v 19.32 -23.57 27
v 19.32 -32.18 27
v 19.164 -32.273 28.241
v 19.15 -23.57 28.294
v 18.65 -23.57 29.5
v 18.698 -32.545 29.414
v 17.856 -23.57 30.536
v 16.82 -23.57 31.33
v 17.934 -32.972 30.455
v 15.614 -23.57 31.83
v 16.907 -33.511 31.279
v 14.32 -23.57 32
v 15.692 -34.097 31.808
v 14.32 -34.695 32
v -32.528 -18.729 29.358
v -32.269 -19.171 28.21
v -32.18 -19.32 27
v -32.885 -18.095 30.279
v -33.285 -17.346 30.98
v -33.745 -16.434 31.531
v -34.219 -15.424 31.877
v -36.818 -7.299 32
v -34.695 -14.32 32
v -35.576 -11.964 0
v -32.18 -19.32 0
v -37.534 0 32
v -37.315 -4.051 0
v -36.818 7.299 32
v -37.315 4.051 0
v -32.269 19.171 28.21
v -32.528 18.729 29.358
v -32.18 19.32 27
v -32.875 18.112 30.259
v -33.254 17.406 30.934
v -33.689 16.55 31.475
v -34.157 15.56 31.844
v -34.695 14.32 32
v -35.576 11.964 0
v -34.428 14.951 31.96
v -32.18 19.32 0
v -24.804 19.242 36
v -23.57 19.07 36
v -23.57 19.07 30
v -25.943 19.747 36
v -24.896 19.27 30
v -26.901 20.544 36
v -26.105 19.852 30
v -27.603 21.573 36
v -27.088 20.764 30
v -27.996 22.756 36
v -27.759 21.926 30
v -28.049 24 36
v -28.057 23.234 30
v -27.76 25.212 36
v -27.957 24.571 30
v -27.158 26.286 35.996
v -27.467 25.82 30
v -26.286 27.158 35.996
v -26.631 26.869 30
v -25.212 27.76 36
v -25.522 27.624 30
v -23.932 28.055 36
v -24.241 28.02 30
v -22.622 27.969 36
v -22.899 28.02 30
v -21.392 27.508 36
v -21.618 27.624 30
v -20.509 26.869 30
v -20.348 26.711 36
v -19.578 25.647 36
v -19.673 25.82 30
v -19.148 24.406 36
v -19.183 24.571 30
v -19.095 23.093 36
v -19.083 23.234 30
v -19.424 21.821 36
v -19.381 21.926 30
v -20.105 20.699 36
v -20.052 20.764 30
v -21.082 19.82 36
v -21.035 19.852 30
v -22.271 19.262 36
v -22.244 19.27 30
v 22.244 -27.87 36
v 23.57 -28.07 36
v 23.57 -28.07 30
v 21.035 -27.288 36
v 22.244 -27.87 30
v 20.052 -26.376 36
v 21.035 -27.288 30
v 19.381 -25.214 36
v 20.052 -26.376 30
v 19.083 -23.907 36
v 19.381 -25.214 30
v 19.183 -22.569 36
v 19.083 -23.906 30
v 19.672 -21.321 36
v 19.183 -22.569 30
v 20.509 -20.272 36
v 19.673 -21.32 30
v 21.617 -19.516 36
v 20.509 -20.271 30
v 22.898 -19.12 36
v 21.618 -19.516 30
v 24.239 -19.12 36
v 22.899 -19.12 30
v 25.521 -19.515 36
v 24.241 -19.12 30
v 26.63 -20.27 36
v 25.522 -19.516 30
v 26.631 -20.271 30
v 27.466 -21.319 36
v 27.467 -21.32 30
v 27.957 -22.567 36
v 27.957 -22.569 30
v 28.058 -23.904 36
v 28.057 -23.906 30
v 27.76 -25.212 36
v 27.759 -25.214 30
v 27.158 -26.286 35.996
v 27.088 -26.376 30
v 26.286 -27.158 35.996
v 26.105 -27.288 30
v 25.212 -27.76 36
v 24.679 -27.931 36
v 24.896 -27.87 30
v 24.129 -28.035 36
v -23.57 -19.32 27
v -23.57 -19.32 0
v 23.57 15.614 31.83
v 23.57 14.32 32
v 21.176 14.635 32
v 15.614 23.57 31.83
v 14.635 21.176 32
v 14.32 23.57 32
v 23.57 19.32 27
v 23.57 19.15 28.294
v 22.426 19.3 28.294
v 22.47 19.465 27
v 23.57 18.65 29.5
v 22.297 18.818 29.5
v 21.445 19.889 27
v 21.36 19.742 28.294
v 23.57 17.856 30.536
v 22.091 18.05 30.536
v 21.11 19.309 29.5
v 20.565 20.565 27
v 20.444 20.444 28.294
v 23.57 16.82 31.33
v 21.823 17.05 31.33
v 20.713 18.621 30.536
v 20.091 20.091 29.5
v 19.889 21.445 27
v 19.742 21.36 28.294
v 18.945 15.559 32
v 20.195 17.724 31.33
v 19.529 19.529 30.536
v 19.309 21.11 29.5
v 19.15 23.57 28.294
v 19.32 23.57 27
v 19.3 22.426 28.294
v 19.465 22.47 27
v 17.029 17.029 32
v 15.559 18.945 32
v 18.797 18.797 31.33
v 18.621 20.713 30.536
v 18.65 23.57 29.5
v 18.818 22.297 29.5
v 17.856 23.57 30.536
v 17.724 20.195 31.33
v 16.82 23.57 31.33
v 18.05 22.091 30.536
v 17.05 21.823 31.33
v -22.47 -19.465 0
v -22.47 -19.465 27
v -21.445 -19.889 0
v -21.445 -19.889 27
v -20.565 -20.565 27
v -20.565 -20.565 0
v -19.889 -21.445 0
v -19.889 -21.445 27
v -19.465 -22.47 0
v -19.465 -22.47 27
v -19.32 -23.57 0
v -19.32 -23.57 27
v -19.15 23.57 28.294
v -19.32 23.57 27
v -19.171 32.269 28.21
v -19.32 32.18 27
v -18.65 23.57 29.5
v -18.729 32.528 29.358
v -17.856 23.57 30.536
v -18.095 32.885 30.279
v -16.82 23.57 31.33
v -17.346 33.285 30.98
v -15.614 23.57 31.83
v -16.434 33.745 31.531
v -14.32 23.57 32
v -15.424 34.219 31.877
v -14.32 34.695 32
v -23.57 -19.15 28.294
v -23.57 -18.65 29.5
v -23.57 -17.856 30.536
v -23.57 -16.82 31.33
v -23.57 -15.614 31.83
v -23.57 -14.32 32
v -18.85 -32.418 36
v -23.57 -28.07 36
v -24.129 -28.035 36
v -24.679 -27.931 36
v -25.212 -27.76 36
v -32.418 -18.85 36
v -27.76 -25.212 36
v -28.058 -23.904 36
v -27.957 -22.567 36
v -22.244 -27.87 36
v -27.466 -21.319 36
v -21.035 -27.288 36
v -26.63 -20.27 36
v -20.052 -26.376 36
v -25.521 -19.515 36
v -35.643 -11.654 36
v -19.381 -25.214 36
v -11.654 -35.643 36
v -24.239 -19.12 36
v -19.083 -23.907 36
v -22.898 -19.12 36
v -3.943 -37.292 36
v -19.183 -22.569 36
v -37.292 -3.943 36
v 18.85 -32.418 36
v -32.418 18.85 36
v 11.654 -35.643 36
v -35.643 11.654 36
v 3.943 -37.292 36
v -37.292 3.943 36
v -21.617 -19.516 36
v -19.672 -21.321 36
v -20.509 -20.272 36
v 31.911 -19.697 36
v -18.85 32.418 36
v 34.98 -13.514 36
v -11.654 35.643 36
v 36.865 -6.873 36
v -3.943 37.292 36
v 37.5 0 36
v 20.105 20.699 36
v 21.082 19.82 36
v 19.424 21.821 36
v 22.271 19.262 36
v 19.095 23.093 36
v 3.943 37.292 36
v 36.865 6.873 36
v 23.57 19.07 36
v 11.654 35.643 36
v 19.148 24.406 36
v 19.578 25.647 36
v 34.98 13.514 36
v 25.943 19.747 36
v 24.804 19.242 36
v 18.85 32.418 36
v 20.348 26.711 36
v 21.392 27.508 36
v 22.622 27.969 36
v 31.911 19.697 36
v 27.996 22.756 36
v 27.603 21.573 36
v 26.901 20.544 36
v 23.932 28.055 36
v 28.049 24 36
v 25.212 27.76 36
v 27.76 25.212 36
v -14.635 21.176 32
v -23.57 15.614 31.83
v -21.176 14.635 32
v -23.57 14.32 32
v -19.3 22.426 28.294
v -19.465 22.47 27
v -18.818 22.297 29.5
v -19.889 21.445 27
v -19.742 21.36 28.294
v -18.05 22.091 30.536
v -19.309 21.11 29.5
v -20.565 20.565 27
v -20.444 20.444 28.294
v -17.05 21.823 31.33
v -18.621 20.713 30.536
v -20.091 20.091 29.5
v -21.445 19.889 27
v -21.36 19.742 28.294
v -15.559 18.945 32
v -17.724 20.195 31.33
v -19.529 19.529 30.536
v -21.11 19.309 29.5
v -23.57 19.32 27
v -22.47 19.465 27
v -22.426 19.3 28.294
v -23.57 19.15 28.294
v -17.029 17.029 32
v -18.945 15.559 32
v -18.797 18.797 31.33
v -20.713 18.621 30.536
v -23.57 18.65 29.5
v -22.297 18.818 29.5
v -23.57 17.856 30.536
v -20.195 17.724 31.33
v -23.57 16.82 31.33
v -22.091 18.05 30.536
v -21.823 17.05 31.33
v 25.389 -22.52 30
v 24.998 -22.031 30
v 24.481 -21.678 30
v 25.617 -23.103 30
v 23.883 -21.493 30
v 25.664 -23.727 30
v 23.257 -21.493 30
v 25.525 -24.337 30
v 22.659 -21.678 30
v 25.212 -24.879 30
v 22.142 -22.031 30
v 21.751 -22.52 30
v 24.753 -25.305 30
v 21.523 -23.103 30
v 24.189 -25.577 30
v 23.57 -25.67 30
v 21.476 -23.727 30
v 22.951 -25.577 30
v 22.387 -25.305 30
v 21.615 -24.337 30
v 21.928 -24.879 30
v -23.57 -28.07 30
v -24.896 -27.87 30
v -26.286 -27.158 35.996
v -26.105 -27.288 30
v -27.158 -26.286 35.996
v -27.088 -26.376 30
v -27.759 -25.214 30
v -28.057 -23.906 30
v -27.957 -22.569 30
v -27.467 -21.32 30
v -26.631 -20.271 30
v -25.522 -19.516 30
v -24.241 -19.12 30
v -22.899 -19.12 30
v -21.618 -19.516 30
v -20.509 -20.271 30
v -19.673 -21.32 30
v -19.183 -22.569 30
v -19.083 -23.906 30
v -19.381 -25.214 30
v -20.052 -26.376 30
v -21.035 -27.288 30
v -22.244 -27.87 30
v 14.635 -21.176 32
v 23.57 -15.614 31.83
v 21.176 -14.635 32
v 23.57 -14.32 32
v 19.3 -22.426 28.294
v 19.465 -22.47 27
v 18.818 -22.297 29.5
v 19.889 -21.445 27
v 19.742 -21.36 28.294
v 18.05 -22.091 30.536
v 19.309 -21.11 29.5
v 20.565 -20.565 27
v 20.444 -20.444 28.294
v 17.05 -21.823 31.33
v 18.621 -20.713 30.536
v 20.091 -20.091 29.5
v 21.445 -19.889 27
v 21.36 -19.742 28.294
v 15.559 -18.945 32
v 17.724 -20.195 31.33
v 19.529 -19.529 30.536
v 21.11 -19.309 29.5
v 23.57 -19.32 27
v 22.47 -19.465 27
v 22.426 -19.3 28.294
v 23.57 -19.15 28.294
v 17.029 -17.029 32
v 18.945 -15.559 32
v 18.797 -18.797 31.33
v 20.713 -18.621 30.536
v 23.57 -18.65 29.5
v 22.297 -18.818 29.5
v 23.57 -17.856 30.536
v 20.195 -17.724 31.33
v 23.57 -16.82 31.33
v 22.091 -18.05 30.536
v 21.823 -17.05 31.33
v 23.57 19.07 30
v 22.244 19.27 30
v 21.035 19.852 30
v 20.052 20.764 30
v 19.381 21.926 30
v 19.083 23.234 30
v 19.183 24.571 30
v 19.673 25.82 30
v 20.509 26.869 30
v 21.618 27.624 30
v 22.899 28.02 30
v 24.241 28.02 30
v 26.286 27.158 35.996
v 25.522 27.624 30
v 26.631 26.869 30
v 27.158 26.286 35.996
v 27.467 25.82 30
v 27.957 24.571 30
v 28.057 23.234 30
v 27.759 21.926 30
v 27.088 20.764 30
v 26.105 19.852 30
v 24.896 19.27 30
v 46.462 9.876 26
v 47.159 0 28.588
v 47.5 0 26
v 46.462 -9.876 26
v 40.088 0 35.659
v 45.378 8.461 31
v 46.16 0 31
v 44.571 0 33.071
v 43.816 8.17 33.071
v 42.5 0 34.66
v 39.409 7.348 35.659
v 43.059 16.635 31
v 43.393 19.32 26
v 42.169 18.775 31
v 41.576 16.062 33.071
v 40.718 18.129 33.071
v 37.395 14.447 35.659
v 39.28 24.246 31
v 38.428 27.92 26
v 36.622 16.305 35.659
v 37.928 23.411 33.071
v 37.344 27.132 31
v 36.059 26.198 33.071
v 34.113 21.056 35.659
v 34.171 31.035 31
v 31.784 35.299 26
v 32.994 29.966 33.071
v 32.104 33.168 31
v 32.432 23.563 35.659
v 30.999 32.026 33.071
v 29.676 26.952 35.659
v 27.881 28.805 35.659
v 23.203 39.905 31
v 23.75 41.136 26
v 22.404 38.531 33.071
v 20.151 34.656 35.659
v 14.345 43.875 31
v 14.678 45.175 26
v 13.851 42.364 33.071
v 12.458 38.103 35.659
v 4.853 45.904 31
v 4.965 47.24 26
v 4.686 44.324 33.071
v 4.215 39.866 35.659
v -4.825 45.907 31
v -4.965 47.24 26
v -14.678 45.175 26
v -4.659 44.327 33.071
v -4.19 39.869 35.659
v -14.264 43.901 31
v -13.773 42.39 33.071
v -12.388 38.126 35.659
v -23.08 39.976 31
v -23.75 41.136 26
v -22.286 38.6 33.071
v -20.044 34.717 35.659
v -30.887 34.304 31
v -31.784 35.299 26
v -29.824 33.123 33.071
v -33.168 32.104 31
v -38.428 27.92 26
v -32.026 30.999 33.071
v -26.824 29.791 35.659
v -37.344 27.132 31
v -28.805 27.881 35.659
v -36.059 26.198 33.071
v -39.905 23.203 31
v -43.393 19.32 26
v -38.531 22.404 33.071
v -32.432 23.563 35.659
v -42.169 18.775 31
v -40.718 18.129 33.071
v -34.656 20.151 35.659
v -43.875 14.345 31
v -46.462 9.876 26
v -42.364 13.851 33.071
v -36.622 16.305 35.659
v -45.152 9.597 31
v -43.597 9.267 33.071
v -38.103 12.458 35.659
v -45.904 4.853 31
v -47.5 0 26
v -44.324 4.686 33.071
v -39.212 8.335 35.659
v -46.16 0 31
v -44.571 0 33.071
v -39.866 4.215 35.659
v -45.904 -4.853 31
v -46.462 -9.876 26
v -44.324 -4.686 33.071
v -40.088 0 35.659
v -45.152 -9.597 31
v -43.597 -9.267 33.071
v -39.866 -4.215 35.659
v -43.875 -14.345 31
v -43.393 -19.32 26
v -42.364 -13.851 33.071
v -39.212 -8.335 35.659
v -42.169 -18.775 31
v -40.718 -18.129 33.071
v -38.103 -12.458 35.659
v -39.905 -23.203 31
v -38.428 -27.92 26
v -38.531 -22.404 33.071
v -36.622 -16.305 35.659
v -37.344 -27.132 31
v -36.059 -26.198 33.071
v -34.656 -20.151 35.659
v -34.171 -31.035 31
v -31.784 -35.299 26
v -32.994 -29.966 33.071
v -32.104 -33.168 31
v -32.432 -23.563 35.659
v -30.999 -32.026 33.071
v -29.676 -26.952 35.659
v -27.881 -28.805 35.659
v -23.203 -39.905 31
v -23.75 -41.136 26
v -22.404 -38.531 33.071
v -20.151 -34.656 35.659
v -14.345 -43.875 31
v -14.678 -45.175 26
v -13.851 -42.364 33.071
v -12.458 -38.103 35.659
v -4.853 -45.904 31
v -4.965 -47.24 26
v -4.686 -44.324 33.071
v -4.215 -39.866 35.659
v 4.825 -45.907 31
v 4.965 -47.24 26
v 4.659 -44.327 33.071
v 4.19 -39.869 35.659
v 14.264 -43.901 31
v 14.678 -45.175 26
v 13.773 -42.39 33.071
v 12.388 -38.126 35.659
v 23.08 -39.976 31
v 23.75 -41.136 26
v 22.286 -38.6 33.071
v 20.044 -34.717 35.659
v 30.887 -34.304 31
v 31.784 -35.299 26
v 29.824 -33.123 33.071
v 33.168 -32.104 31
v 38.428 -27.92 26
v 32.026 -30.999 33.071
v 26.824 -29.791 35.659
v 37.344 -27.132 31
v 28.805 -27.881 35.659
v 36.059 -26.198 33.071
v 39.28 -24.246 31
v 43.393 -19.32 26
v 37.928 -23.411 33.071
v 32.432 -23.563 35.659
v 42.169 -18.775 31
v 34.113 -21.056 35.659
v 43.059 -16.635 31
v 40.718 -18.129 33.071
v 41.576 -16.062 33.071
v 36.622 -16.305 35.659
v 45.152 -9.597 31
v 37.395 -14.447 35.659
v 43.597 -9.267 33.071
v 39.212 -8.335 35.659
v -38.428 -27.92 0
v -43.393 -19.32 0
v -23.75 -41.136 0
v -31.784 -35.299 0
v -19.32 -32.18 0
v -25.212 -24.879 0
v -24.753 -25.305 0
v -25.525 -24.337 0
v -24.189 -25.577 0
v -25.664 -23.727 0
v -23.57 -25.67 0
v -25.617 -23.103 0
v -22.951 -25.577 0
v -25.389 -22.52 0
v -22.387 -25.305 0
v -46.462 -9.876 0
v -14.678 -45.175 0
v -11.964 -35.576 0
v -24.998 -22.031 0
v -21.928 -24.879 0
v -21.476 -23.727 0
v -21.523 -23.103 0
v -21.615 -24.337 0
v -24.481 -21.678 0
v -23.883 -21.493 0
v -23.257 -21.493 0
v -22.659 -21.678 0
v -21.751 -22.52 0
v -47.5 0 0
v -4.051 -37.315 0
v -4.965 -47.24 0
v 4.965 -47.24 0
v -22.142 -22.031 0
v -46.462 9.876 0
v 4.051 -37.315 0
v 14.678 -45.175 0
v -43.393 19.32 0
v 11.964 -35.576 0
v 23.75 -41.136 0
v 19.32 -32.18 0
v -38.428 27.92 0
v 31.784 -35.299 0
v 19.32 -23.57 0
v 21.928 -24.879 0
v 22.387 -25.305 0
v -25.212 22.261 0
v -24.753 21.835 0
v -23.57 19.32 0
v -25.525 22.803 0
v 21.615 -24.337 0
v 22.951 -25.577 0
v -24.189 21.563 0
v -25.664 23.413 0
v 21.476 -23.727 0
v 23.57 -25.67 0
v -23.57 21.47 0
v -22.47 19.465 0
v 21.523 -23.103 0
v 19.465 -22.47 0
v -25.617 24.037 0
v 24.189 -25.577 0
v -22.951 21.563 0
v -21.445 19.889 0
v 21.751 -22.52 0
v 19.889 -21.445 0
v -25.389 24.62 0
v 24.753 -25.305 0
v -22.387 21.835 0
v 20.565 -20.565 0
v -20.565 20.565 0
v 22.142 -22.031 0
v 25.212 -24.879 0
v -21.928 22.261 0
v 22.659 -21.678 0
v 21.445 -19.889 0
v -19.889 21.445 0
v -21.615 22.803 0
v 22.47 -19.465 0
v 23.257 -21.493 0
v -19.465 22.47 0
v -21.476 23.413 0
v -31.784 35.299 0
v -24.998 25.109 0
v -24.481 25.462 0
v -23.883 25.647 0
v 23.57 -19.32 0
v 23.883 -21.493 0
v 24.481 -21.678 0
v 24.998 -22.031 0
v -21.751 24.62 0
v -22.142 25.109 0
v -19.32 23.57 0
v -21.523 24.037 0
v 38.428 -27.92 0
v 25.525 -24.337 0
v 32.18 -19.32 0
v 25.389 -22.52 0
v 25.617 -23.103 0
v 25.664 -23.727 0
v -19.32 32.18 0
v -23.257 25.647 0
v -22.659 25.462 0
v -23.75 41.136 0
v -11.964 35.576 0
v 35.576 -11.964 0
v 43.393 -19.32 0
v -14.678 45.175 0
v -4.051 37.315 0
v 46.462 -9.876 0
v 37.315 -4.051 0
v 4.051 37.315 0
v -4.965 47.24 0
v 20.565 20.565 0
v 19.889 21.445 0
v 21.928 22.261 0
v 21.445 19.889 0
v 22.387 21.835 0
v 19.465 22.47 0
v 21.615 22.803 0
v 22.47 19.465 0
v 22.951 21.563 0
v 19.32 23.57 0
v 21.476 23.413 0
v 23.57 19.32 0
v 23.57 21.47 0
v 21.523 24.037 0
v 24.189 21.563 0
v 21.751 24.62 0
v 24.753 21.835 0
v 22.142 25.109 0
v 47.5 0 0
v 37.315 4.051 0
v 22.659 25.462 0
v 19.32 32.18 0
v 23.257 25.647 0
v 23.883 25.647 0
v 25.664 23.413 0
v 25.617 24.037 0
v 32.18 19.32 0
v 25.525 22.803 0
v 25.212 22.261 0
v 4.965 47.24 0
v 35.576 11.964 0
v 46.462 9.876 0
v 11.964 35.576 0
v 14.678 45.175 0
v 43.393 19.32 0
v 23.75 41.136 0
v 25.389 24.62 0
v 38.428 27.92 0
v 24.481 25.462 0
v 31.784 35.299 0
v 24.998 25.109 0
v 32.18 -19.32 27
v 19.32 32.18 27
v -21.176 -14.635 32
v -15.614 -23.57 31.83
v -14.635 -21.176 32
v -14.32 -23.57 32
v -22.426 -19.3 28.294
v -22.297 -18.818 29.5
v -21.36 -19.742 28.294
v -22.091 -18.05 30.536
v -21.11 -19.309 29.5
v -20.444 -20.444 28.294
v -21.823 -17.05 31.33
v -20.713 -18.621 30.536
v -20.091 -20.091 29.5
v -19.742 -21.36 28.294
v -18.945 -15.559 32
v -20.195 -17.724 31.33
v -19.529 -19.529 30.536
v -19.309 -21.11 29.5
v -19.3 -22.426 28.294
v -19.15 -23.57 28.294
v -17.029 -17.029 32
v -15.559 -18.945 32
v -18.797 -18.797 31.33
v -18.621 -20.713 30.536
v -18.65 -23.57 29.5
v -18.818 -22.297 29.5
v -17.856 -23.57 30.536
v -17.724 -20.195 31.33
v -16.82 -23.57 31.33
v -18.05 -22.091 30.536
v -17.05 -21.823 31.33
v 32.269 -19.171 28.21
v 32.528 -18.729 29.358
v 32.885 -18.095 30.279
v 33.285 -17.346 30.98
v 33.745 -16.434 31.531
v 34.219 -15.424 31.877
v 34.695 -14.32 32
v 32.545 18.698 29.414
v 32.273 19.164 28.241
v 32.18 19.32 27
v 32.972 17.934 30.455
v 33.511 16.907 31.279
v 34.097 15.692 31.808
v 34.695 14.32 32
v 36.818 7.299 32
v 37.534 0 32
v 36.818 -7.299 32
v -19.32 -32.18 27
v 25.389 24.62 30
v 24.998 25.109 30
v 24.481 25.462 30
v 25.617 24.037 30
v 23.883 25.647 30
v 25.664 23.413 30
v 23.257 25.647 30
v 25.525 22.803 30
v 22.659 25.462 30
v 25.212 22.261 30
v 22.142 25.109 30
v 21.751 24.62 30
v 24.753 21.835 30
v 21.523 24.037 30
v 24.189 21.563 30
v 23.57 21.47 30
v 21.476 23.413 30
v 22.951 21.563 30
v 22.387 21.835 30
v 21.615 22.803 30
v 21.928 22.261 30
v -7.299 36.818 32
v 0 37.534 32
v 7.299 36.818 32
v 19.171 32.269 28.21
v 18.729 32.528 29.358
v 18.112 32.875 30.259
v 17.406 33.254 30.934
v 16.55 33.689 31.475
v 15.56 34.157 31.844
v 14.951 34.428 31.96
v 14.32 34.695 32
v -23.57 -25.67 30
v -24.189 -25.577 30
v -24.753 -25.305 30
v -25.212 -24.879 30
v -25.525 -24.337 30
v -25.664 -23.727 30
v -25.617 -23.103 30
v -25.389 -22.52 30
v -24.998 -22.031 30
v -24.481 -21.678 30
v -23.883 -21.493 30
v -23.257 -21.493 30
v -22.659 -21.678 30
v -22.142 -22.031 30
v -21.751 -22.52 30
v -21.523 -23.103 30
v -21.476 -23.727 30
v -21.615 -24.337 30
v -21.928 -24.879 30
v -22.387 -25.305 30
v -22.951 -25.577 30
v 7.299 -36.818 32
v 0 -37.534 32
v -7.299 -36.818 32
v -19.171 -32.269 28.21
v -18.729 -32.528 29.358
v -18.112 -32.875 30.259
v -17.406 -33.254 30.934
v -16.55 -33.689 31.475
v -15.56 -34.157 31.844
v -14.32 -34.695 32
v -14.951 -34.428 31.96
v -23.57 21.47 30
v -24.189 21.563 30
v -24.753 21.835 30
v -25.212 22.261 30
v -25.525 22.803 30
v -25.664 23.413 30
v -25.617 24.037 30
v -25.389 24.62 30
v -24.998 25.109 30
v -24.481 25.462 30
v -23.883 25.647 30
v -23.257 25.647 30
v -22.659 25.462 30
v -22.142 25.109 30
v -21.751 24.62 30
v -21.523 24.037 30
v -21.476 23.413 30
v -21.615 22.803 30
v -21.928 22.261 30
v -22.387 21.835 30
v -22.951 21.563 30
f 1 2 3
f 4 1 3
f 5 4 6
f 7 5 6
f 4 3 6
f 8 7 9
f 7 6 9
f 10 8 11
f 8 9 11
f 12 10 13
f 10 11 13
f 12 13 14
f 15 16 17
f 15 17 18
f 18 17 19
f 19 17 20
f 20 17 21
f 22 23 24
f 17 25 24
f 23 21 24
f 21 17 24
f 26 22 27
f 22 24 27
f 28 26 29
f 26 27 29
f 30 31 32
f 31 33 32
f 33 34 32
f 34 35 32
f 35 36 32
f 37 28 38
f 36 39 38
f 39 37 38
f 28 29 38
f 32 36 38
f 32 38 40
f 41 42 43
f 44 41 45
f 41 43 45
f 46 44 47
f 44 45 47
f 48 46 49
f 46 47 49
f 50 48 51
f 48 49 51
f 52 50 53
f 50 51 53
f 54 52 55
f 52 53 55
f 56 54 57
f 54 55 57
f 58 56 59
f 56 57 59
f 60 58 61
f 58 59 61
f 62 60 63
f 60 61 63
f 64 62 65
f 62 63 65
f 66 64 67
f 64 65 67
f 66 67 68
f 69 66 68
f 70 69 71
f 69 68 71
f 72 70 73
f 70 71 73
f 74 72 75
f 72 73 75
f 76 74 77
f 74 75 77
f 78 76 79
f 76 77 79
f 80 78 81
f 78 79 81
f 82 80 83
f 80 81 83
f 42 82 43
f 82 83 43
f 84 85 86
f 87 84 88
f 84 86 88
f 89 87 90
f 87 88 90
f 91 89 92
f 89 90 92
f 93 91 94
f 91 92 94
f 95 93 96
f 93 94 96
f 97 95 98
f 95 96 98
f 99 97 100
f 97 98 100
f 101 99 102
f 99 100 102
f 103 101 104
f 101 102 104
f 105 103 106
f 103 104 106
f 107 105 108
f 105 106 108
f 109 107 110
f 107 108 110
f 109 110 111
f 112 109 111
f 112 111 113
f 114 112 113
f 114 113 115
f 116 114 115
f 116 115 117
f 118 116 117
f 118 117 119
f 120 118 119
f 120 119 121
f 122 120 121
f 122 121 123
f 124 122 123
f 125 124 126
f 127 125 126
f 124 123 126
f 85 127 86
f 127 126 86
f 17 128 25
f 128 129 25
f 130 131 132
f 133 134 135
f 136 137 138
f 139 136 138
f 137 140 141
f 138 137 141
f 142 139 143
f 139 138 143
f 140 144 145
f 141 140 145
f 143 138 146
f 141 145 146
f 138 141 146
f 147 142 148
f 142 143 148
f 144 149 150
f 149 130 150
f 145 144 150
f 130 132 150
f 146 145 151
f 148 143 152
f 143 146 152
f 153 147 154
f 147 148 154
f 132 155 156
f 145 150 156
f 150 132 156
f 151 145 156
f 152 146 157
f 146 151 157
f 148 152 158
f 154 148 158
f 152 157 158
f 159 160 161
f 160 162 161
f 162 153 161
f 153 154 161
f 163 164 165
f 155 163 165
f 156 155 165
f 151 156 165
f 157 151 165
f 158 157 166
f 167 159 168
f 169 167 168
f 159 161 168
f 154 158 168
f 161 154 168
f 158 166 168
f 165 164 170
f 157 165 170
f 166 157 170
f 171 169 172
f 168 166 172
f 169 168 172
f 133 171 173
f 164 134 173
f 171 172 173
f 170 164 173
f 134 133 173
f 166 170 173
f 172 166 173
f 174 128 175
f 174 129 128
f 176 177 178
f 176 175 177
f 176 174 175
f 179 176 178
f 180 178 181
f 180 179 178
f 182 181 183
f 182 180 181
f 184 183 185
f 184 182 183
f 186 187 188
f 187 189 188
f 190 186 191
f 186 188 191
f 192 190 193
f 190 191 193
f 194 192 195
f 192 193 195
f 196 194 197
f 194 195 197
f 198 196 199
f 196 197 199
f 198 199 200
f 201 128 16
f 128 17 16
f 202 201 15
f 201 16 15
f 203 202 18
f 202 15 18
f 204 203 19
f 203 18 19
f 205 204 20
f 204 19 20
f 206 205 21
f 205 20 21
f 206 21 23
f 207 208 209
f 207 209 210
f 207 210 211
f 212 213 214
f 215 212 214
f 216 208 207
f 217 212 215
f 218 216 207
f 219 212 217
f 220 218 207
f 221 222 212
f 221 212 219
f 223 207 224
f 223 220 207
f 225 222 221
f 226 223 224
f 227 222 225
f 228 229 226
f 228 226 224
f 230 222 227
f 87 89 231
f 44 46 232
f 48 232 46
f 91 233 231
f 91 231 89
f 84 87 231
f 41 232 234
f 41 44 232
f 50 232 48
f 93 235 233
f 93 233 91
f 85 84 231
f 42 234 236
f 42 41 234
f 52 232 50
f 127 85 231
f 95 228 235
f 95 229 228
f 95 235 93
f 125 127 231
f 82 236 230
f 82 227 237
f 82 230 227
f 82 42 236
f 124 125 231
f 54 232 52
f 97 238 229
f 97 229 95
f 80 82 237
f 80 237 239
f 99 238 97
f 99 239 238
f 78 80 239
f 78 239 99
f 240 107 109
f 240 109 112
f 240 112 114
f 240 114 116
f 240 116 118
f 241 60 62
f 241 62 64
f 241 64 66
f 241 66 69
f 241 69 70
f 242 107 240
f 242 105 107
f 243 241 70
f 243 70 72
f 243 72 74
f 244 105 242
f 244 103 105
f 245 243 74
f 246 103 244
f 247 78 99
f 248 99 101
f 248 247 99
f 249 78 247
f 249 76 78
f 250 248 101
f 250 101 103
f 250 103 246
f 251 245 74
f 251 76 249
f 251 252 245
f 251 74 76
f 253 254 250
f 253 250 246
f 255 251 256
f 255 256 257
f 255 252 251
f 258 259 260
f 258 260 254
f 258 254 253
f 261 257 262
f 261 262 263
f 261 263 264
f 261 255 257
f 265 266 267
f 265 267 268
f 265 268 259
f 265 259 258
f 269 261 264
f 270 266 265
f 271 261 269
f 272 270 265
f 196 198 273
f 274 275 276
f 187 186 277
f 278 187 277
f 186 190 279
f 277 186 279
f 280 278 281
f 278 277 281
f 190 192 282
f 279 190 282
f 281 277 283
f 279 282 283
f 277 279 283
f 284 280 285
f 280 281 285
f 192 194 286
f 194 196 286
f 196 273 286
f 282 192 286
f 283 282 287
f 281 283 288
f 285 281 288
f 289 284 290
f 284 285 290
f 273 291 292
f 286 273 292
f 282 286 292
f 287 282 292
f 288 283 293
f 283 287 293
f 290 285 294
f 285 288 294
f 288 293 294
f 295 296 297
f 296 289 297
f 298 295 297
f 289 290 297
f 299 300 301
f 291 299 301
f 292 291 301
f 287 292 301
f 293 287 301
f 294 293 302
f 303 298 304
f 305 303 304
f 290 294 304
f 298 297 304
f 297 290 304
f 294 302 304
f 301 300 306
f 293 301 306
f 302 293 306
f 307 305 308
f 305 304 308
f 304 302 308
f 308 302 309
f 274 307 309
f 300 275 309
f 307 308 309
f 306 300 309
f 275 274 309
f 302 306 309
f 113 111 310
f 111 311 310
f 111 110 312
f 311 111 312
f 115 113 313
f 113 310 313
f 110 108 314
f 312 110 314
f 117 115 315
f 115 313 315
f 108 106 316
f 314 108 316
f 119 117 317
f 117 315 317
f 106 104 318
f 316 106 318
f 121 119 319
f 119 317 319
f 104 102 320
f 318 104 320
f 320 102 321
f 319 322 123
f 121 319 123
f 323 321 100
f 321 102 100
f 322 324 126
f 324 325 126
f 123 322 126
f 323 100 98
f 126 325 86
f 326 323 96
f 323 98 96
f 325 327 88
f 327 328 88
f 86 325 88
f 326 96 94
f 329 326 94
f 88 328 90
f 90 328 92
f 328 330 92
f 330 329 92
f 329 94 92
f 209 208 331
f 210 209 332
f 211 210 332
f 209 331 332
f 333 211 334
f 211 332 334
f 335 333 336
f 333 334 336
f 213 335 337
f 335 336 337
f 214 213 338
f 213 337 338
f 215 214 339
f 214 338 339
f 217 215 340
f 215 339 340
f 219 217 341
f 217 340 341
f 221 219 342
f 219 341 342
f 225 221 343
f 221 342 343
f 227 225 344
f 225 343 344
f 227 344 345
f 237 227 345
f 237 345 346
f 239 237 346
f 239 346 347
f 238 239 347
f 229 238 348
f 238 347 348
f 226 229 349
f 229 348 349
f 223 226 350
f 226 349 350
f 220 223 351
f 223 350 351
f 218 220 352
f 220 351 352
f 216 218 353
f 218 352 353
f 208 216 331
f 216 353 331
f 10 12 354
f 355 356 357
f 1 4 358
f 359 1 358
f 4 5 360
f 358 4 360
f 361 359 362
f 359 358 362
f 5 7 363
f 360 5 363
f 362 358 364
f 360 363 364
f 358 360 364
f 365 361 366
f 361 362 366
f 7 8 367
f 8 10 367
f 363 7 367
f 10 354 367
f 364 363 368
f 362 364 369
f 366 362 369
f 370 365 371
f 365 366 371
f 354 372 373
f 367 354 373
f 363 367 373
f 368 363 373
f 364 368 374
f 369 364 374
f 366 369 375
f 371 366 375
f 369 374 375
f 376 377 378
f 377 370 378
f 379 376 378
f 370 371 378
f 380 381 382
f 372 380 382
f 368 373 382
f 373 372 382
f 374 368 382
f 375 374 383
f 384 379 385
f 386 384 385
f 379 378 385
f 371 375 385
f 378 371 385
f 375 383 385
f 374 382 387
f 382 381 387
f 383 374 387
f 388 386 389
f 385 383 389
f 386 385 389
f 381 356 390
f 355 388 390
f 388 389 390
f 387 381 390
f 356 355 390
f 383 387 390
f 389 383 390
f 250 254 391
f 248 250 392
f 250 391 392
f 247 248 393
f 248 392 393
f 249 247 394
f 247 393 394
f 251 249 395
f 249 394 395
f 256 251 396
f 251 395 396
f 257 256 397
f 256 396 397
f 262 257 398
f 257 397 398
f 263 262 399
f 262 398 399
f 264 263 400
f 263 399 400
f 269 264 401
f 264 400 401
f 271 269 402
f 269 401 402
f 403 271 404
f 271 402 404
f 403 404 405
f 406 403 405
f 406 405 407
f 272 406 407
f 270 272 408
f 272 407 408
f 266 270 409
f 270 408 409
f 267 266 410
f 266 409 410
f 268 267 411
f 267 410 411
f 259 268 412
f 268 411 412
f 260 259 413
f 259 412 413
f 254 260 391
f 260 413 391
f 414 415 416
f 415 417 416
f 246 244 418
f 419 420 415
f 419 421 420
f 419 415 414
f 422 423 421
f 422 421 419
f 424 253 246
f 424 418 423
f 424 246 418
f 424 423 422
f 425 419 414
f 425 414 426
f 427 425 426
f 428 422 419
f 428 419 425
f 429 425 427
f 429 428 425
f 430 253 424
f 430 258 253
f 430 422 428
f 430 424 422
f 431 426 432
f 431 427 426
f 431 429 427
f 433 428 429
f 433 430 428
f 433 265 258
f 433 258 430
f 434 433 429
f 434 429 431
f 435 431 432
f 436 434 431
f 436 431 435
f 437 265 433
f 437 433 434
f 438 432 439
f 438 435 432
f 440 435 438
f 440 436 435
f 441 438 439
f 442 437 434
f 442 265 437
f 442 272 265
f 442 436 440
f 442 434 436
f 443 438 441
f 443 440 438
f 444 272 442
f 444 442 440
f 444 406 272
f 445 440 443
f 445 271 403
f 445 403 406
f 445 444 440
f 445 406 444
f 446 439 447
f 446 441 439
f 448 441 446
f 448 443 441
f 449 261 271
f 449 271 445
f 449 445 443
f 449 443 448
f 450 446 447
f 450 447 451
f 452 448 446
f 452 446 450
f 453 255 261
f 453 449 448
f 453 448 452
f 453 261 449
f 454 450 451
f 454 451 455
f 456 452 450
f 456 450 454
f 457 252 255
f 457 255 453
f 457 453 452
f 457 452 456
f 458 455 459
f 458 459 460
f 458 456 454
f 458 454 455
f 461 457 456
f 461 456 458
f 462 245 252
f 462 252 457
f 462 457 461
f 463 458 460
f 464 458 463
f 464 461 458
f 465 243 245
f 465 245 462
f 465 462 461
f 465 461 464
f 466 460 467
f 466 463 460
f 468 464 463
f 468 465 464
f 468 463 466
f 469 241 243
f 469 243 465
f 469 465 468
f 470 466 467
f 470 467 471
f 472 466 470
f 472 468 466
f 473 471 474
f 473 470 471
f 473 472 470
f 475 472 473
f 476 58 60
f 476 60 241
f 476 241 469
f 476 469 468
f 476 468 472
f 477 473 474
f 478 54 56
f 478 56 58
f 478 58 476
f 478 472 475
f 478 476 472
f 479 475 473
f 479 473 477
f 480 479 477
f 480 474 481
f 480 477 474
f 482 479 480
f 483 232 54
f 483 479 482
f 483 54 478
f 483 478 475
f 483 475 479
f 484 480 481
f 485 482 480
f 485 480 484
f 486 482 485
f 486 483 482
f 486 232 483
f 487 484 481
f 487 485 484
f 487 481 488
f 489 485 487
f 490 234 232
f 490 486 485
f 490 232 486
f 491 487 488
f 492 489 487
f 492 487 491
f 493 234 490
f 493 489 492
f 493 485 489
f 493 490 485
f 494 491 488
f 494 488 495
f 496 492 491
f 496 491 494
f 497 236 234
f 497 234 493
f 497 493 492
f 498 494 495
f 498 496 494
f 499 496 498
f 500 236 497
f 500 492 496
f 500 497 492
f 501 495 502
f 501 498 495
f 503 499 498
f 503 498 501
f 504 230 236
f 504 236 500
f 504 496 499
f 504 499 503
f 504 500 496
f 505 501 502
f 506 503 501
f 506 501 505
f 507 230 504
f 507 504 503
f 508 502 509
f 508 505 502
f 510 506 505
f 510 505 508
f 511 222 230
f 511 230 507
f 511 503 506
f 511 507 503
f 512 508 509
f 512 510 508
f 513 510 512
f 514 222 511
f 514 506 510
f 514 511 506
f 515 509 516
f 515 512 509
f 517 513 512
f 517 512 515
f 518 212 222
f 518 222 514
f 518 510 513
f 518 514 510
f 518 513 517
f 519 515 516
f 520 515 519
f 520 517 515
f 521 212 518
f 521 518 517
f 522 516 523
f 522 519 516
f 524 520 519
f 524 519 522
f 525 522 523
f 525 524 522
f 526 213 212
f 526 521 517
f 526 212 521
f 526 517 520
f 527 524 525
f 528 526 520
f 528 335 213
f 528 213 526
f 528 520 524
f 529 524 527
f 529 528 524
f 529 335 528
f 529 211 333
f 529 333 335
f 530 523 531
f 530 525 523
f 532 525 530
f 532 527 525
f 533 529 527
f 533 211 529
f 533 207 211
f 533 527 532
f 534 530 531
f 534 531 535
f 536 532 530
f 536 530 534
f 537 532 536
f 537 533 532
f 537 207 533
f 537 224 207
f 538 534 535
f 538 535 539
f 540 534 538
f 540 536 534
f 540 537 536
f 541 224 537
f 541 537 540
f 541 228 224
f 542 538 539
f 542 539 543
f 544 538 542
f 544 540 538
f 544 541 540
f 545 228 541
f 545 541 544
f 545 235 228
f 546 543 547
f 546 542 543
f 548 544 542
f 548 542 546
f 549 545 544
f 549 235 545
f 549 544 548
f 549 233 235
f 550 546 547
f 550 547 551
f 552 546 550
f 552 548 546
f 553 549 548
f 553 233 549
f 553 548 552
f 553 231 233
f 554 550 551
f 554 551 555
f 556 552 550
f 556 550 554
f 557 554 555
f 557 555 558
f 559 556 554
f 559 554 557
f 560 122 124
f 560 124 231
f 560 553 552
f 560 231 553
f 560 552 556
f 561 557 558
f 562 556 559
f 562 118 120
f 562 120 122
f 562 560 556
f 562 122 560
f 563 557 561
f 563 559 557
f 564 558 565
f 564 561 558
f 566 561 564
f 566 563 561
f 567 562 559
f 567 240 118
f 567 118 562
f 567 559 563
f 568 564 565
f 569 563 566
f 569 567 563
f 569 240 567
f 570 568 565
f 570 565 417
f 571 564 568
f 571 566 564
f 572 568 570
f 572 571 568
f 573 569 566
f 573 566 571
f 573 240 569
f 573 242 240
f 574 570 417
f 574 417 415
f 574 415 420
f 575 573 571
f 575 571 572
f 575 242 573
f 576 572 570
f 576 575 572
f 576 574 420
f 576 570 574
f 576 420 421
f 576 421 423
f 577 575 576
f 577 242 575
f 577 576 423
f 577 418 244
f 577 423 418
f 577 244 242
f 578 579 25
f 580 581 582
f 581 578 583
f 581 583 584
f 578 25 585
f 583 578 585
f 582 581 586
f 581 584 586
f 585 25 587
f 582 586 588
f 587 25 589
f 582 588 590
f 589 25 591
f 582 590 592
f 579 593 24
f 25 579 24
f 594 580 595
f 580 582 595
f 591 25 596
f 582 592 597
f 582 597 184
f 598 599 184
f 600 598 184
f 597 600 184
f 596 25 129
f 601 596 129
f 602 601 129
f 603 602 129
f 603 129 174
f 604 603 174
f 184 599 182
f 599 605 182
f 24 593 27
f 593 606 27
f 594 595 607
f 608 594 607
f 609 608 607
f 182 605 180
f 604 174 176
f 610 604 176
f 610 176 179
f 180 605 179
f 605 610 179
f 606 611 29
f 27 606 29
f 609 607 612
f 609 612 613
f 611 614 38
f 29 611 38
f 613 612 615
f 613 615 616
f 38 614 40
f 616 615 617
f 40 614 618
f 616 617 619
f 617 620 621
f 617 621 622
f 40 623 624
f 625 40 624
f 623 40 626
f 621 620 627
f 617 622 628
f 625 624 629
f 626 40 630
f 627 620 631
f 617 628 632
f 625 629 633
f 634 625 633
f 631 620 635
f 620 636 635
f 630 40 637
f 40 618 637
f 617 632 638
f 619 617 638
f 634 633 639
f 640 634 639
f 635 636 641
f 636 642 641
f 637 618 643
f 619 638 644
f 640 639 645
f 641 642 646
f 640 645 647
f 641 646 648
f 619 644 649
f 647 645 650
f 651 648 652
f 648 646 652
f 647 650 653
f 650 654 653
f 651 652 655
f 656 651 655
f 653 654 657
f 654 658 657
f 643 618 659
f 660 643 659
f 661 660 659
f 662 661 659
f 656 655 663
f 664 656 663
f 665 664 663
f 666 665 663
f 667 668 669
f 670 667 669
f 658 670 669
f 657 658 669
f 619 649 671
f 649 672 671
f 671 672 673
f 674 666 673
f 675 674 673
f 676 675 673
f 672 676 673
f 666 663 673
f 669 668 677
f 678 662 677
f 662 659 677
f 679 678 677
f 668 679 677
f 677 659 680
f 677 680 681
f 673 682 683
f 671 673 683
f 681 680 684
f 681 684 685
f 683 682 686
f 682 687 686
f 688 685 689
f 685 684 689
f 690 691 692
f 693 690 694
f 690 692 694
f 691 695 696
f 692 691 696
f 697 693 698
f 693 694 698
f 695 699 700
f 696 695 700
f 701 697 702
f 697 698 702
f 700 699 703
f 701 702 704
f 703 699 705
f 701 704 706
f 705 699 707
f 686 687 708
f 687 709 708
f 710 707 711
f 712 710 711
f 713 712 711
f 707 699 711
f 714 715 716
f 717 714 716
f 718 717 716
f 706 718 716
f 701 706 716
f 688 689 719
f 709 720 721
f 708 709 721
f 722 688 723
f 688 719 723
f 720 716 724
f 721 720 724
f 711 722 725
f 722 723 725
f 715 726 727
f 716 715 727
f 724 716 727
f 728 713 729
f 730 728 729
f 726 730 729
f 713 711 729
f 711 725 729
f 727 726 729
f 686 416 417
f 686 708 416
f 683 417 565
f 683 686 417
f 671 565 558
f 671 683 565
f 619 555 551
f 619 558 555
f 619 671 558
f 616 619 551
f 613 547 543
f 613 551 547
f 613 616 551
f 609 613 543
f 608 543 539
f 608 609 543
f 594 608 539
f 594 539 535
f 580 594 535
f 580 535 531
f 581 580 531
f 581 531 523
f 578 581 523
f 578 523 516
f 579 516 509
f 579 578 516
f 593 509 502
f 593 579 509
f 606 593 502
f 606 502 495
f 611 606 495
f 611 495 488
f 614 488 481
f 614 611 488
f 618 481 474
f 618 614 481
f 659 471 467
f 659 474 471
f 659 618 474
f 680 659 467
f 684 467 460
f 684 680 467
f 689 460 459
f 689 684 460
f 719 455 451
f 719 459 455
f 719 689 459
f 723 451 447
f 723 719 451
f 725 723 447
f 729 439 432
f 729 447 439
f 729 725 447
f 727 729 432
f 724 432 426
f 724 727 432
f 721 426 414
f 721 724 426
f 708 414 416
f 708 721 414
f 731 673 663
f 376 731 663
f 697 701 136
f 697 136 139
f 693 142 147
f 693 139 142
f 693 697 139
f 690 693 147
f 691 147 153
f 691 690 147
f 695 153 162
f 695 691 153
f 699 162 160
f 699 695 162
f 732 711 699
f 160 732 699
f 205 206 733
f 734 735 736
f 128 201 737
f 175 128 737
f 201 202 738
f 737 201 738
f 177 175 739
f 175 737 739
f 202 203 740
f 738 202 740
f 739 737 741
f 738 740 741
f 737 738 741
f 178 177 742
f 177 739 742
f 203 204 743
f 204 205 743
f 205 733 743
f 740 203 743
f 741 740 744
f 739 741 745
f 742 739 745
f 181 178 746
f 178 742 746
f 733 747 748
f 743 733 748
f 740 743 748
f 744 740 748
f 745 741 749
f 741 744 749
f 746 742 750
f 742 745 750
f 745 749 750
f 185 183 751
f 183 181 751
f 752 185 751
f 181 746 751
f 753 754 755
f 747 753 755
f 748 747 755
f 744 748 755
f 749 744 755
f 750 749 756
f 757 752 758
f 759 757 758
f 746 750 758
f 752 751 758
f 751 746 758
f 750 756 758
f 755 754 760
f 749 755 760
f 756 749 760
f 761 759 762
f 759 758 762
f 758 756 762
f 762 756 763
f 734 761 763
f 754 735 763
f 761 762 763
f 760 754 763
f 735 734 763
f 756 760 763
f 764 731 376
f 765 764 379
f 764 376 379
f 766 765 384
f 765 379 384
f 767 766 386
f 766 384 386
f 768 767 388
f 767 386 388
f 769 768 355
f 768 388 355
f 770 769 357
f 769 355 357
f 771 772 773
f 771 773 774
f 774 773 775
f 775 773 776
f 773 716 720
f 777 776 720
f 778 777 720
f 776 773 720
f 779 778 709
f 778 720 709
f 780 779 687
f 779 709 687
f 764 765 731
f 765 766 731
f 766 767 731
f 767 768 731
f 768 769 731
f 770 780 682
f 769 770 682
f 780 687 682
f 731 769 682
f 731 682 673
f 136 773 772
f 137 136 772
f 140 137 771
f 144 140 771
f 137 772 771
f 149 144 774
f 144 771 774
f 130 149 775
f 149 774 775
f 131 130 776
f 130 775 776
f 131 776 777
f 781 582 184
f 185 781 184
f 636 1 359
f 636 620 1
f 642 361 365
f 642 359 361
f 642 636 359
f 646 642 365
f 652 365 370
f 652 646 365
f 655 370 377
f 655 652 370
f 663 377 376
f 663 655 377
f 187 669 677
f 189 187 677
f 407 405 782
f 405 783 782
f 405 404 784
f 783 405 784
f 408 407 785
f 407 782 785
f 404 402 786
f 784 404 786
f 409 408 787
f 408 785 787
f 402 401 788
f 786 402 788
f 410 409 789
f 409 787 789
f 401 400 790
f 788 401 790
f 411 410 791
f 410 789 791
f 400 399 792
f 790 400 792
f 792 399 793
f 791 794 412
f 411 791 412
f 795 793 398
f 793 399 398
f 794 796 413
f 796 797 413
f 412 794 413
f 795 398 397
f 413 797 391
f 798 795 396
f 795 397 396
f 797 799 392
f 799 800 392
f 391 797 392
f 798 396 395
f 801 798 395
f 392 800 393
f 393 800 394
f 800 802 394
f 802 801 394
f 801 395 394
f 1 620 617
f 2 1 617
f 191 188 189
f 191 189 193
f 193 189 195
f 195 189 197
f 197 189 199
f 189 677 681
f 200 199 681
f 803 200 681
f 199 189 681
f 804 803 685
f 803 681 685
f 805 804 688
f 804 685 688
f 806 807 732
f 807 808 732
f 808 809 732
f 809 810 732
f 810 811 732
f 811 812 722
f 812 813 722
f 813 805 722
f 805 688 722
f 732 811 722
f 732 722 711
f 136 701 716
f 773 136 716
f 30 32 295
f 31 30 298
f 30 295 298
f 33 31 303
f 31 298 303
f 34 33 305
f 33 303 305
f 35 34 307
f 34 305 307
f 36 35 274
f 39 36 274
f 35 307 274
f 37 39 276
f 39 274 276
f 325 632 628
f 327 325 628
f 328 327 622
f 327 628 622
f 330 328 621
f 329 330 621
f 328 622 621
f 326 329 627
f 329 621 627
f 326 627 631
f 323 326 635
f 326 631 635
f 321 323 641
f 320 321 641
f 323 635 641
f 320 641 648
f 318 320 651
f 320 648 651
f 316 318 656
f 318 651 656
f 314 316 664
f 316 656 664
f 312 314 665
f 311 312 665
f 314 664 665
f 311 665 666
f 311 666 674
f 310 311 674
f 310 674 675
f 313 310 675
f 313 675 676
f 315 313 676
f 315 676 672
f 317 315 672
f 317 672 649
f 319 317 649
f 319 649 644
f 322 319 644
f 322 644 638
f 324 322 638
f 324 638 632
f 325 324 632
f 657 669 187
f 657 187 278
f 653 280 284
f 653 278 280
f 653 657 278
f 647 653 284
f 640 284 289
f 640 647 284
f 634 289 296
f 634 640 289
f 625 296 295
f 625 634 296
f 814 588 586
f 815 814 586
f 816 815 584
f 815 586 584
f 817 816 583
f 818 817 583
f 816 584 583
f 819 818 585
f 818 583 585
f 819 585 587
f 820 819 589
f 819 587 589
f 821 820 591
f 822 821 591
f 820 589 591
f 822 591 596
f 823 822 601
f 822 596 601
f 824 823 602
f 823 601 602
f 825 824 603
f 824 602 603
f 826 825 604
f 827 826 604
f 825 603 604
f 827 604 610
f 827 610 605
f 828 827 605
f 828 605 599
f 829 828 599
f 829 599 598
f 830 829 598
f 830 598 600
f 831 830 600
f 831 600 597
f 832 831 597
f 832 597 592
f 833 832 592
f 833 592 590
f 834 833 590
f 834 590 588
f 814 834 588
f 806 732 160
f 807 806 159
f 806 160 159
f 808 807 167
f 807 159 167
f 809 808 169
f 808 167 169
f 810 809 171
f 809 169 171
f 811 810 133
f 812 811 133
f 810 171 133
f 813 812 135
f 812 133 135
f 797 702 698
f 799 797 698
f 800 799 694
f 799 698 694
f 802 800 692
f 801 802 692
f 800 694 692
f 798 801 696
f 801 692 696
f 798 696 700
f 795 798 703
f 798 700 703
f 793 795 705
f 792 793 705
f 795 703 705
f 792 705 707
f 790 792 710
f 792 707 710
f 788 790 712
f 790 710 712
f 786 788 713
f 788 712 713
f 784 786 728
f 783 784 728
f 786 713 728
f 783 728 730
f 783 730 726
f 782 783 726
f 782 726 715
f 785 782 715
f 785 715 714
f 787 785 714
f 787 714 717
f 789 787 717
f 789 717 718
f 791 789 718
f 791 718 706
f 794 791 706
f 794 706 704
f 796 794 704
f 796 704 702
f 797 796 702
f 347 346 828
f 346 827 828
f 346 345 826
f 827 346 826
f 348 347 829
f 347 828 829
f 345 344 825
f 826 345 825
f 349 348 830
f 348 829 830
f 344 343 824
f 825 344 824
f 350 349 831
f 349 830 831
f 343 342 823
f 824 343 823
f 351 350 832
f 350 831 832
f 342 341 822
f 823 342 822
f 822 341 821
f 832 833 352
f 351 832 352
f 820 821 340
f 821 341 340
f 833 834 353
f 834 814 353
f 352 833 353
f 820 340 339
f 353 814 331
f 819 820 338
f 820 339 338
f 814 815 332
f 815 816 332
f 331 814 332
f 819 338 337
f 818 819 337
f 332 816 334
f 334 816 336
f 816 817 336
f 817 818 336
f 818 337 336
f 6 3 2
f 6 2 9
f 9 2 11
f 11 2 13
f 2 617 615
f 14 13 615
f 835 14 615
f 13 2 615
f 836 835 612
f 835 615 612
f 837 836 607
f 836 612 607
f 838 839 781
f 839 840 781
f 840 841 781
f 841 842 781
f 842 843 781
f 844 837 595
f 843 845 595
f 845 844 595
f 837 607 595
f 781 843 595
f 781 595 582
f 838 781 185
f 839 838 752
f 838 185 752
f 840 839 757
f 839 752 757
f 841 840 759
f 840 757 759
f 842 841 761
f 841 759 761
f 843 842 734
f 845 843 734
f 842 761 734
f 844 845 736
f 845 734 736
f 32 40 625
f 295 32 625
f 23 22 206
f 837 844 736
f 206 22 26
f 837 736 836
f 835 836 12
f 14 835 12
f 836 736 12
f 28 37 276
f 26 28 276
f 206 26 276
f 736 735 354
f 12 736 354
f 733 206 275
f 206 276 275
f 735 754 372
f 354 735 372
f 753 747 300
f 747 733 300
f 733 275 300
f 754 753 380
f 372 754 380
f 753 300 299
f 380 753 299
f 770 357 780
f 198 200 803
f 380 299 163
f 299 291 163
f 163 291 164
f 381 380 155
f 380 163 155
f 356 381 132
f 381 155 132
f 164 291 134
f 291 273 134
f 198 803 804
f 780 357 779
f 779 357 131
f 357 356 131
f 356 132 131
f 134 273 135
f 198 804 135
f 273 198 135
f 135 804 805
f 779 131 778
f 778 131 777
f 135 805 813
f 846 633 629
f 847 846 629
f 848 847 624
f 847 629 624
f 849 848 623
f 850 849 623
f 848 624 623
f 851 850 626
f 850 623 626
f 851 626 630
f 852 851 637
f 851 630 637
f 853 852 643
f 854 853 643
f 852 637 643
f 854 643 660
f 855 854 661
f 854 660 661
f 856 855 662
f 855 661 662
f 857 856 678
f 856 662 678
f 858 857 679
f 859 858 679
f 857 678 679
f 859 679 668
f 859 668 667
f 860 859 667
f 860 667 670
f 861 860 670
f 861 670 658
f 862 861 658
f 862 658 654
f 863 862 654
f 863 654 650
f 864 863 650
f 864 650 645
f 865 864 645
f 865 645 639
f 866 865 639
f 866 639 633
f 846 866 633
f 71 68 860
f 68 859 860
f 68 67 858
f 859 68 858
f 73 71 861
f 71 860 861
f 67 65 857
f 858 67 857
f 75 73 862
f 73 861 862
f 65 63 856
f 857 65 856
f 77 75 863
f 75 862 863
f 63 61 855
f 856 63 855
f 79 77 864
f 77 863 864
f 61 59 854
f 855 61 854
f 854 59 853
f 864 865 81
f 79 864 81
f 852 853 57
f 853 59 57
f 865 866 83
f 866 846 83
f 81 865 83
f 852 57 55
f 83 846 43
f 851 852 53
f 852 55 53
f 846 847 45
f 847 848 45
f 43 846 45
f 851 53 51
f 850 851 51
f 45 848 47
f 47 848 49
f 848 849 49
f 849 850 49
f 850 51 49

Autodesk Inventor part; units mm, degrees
ref_plane "YZ Plane" through (0, 0, 0) normal (1, 0, 0) x (0, 1, 0)
ref_plane "XZ Plane" through (0, 0, 0) normal (0, 1, 0) x (-1, 0, 0)
sketch "Skizze1" plane through (0, 0, 0) normal (0, 0, 1) x (1, 0, 0)
  line L0 (24.616, 19.6663) -> (20.7123, 20.7123) projected
  line L1 (20.7123, 20.7123) -> (19.6663, 24.616) projected
  line L2 (19.6663, 24.616) -> (22.524, 27.4737) projected
  line L3 (22.524, 27.4737) -> (26.4277, 26.4277) projected
  line L4 (26.4277, 26.4277) -> (27.4737, 22.524) projected
  line L5 (27.4737, 22.524) -> (24.616, 19.6663) projected
  line L6 (-24.616, -19.6663) -> (-20.7123, -20.7123) projected
  line L7 (-20.7123, -20.7123) -> (-19.6663, -24.616) projected
  line L8 (-19.6663, -24.616) -> (-22.524, -27.4737) projected
  line L9 (-22.524, -27.4737) -> (-26.4277, -26.4277) projected
  line L10 (-26.4277, -26.4277) -> (-27.4737, -22.524) projected
  line L11 (-27.4737, -22.524) -> (-24.616, -19.6663) projected
  line L12 (-20.7123, 20.7123) -> (-24.616, 19.6663) projected
  line L13 (-24.616, 19.6663) -> (-27.4737, 22.524) projected
  line L14 (-27.4737, 22.524) -> (-26.4277, 26.4277) projected
  line L15 (-26.4277, 26.4277) -> (-22.524, 27.4737) projected
  line L16 (-22.524, 27.4737) -> (-19.6663, 24.616) projected
  line L17 (-19.6663, 24.616) -> (-20.7123, 20.7123) projected
  line L18 (19.6663, -24.616) -> (20.7123, -20.7123) projected
  line L19 (20.7123, -20.7123) -> (24.616, -19.6663) projected
  line L20 (24.616, -19.6663) -> (27.4737, -22.524) projected
  line L21 (27.4737, -22.524) -> (26.4277, -26.4277) projected
  line L22 (26.4277, -26.4277) -> (22.524, -27.4737) projected
  line L23 (22.524, -27.4737) -> (19.6663, -24.616) projected
  arc A0 (-23.57, 19.32) -> (-19.32, 23.57) centre (-23.57, 23.57) ccw projected
  line L24 (-19.32, 23.57) -> (-19.32, 32.18) projected
  line L25 (-19.32, 32.18) -> (19.32, 32.18) projected
  line L26 (19.32, 32.18) -> (19.32, 23.57) projected
  arc A1 (19.32, 23.57) -> (23.57, 19.32) centre (23.57, 23.57) ccw projected
  line L27 (23.57, 19.32) -> (32.18, 19.32) projected
  line L28 (32.18, 19.32) -> (32.18, -19.32) projected
  line L29 (32.18, -19.32) -> (23.57, -19.32) projected
  arc A2 (23.57, -19.32) -> (19.32, -23.57) centre (23.57, -23.57) ccw projected
  line L30 (19.32, -23.57) -> (19.32, -32.18) projected
  line L31 (19.32, -32.18) -> (-19.32, -32.18) projected
  line L32 (-19.32, -32.18) -> (-19.32, -23.57) projected
  arc A3 (-19.32, -23.57) -> (-23.57, -19.32) centre (-23.57, -23.57) ccw projected
  line L33 (-23.57, -19.32) -> (-32.18, -19.32) projected
  line L34 (-32.18, -19.32) -> (-32.18, 19.32) projected
  line L35 (-32.18, 19.32) -> (-23.57, 19.32) projected
  circle A4 centre (0, 0) radius 47.5
  circle A5 centre (23.57, -23.57) radius 2
  circle A6 centre (23.57, 23.57) radius 2
  circle A7 centre (-23.57, 23.57) radius 2
  circle A8 centre (-23.57, -23.57) radius 2
  arc A9 (32.18, -19.32) -> (32.18, 19.32) centre (0, 0) ccw
  arc A10 (-19.32, -32.18) -> (19.32, -32.18) centre (0, 0) ccw
  arc A11 (-32.18, 19.32) -> (-32.18, -19.32) centre (0, 0) ccw
  arc A12 (19.32, 32.18) -> (-19.32, 32.18) centre (0, 0) ccw
  point P0 (0, 0)
  dimension "d0" = 4
  dimension "d40" = 95
extrude "Extrusion1" add sketch "Skizze1" along normal blind 32 contours L0 L1 L2 L3 L4 L5 | L6 L7 L8 L9 L10 L11 | L12 L13 L14 L15 L16 L17 | L18 L19 L20 L21 L22 L23 | A4
ref_plane "Arbeitsebene1" through (0, 0, 0) normal (1, 0, 0) x (0, 0, 1)
sketch "Skizze9" plane through (0, 0, 32) normal (0, 0, 1) x (1, 0, 0)
  circle A0 centre (23.57, -23.57) radius 2 projected
  circle A1 centre (-23.57, 23.57) radius 2 projected
  circle A2 centre (-23.57, -23.57) radius 2 projected
  circle A3 centre (23.57, 23.57) radius 2 projected
  circle A4 centre (0, 0) radius 47.5 projected
  line L0 (32.18, -19.32) -> (23.57, -19.32) projected
  arc A5 (23.57, -19.32) -> (19.32, -23.57) centre (23.57, -23.57) ccw projected
  line L1 (19.32, -23.57) -> (19.32, -32.18) projected
  arc A6 (-19.32, -32.18) -> (19.32, -32.18) centre (0, 0) ccw projected
  line L2 (-19.32, -32.18) -> (-19.32, -23.57) projected
  arc A7 (-19.32, -23.57) -> (-23.57, -19.32) centre (-23.57, -23.57) ccw projected
  line L3 (-23.57, -19.32) -> (-32.18, -19.32) projected
  arc A8 (-32.18, 19.32) -> (-32.18, -19.32) centre (0, 0) ccw projected
  line L4 (-32.18, 19.32) -> (-23.57, 19.32) projected
  arc A9 (-23.57, 19.32) -> (-19.32, 23.57) centre (-23.57, 23.57) ccw projected
  line L5 (-19.32, 23.57) -> (-19.32, 32.18) projected
  arc A10 (19.32, 32.18) -> (-19.32, 32.18) centre (0, 0) ccw projected
  line L6 (19.32, 32.18) -> (19.32, 23.57) projected
  arc A11 (19.32, 23.57) -> (23.57, 19.32) centre (23.57, 23.57) ccw projected
  line L7 (23.57, 19.32) -> (32.18, 19.32) projected
  arc A12 (32.18, -19.32) -> (32.18, 19.32) centre (0, 0) ccw projected
  point P0 (0, 0)
extrude "Extrusion6" add sketch "Skizze9" along normal blind 4 contours A4 | L0 A5 L1 A6 L2 A7 L3 A8 L4 A9 L5 A10 L6 A11 L7 A12
fillet "Rundung3" radius 10 1 edges at (-47.5, 0, 36)
sketch "Skizze10" plane through (0, 0, 0) normal (0, 0, -1) x (-1, 0, 0)
  circle A0 centre (-23.57, -23.57) radius 2 projected
  circle A1 centre (23.57, 23.57) radius 2 projected
  circle A2 centre (23.57, -23.57) radius 2 projected
  circle A3 centre (-23.57, 23.57) radius 2 projected
  line L0 (-23.57, -19.32) -> (-32.18, -19.32) projected
  arc A4 (-32.18, 19.32) -> (-32.18, -19.32) centre (0, 0) ccw projected
  line L1 (-32.18, 19.32) -> (-23.57, 19.32) projected
  arc A5 (-23.57, 19.32) -> (-19.32, 23.57) centre (-23.57, 23.57) ccw projected
  line L2 (-19.32, 23.57) -> (-19.32, 32.18) projected
  arc A6 (19.32, 32.18) -> (-19.32, 32.18) centre (0, 0) ccw projected
  line L3 (19.32, 32.18) -> (19.32, 23.57) projected
  arc A7 (19.32, 23.57) -> (23.57, 19.32) centre (23.57, 23.57) ccw projected
  line L4 (23.57, 19.32) -> (32.18, 19.32) projected
  arc A8 (32.18, -19.32) -> (32.18, 19.32) centre (0, 0) ccw projected
  line L5 (32.18, -19.32) -> (23.57, -19.32) projected
  arc A9 (23.57, -19.32) -> (19.32, -23.57) centre (23.57, -23.57) ccw projected
  line L6 (19.32, -23.57) -> (19.32, -32.18) projected
  arc A10 (-19.32, -32.18) -> (19.32, -32.18) centre (0, 0) ccw projected
  line L7 (-19.32, -32.18) -> (-19.32, -23.57) projected
  arc A11 (-19.32, -23.57) -> (-23.57, -19.32) centre (-23.57, -23.57) ccw projected
  circle A12 centre (0, 0) radius 47.5 projected
  point P0 (0, 0)
fillet "Rundung4" radius 5 12 edges at (20.5648, 20.5648, 32) (27.875, 19.32, 32) (19.32, 27.875, 32) (19.32, -27.875, 32) (27.875, -19.32, 32) (20.5648, -20.5648, 32) (-27.875, -19.32, 32) (-19.32, -27.875, 32) (-20.5648, -20.5648, 32) (-19.32, 27.875, 32) (-27.875, 19.32, 32) (-20.5648, 20.5648, 32)
sketch "Skizze11" plane through (0, 0, 36) normal (0, 0, 1) x (1, 0, 0)
  circle A0 centre (23.57, -23.57) radius 2 projected
  circle A1 centre (-23.57, 23.57) radius 2 projected
  circle A2 centre (-23.57, -23.57) radius 2 projected
  circle A3 centre (23.57, 23.57) radius 2 projected
  circle A4 centre (0, 0) radius 37.5 projected
  point P0 (0, 0)
hole "Bohrung2" at (-23.57, 23.57, 36) at (23.57, 23.57, 36) at (23.57, -23.57, 36) at (-23.57, -23.57, 36) direction (0, 0, -1) diameter 4.2 end through all counterbore diameter 9 counterbore depth 6
properties part number "MotorCoverN24_3" material "ABS-Kunststoff"
